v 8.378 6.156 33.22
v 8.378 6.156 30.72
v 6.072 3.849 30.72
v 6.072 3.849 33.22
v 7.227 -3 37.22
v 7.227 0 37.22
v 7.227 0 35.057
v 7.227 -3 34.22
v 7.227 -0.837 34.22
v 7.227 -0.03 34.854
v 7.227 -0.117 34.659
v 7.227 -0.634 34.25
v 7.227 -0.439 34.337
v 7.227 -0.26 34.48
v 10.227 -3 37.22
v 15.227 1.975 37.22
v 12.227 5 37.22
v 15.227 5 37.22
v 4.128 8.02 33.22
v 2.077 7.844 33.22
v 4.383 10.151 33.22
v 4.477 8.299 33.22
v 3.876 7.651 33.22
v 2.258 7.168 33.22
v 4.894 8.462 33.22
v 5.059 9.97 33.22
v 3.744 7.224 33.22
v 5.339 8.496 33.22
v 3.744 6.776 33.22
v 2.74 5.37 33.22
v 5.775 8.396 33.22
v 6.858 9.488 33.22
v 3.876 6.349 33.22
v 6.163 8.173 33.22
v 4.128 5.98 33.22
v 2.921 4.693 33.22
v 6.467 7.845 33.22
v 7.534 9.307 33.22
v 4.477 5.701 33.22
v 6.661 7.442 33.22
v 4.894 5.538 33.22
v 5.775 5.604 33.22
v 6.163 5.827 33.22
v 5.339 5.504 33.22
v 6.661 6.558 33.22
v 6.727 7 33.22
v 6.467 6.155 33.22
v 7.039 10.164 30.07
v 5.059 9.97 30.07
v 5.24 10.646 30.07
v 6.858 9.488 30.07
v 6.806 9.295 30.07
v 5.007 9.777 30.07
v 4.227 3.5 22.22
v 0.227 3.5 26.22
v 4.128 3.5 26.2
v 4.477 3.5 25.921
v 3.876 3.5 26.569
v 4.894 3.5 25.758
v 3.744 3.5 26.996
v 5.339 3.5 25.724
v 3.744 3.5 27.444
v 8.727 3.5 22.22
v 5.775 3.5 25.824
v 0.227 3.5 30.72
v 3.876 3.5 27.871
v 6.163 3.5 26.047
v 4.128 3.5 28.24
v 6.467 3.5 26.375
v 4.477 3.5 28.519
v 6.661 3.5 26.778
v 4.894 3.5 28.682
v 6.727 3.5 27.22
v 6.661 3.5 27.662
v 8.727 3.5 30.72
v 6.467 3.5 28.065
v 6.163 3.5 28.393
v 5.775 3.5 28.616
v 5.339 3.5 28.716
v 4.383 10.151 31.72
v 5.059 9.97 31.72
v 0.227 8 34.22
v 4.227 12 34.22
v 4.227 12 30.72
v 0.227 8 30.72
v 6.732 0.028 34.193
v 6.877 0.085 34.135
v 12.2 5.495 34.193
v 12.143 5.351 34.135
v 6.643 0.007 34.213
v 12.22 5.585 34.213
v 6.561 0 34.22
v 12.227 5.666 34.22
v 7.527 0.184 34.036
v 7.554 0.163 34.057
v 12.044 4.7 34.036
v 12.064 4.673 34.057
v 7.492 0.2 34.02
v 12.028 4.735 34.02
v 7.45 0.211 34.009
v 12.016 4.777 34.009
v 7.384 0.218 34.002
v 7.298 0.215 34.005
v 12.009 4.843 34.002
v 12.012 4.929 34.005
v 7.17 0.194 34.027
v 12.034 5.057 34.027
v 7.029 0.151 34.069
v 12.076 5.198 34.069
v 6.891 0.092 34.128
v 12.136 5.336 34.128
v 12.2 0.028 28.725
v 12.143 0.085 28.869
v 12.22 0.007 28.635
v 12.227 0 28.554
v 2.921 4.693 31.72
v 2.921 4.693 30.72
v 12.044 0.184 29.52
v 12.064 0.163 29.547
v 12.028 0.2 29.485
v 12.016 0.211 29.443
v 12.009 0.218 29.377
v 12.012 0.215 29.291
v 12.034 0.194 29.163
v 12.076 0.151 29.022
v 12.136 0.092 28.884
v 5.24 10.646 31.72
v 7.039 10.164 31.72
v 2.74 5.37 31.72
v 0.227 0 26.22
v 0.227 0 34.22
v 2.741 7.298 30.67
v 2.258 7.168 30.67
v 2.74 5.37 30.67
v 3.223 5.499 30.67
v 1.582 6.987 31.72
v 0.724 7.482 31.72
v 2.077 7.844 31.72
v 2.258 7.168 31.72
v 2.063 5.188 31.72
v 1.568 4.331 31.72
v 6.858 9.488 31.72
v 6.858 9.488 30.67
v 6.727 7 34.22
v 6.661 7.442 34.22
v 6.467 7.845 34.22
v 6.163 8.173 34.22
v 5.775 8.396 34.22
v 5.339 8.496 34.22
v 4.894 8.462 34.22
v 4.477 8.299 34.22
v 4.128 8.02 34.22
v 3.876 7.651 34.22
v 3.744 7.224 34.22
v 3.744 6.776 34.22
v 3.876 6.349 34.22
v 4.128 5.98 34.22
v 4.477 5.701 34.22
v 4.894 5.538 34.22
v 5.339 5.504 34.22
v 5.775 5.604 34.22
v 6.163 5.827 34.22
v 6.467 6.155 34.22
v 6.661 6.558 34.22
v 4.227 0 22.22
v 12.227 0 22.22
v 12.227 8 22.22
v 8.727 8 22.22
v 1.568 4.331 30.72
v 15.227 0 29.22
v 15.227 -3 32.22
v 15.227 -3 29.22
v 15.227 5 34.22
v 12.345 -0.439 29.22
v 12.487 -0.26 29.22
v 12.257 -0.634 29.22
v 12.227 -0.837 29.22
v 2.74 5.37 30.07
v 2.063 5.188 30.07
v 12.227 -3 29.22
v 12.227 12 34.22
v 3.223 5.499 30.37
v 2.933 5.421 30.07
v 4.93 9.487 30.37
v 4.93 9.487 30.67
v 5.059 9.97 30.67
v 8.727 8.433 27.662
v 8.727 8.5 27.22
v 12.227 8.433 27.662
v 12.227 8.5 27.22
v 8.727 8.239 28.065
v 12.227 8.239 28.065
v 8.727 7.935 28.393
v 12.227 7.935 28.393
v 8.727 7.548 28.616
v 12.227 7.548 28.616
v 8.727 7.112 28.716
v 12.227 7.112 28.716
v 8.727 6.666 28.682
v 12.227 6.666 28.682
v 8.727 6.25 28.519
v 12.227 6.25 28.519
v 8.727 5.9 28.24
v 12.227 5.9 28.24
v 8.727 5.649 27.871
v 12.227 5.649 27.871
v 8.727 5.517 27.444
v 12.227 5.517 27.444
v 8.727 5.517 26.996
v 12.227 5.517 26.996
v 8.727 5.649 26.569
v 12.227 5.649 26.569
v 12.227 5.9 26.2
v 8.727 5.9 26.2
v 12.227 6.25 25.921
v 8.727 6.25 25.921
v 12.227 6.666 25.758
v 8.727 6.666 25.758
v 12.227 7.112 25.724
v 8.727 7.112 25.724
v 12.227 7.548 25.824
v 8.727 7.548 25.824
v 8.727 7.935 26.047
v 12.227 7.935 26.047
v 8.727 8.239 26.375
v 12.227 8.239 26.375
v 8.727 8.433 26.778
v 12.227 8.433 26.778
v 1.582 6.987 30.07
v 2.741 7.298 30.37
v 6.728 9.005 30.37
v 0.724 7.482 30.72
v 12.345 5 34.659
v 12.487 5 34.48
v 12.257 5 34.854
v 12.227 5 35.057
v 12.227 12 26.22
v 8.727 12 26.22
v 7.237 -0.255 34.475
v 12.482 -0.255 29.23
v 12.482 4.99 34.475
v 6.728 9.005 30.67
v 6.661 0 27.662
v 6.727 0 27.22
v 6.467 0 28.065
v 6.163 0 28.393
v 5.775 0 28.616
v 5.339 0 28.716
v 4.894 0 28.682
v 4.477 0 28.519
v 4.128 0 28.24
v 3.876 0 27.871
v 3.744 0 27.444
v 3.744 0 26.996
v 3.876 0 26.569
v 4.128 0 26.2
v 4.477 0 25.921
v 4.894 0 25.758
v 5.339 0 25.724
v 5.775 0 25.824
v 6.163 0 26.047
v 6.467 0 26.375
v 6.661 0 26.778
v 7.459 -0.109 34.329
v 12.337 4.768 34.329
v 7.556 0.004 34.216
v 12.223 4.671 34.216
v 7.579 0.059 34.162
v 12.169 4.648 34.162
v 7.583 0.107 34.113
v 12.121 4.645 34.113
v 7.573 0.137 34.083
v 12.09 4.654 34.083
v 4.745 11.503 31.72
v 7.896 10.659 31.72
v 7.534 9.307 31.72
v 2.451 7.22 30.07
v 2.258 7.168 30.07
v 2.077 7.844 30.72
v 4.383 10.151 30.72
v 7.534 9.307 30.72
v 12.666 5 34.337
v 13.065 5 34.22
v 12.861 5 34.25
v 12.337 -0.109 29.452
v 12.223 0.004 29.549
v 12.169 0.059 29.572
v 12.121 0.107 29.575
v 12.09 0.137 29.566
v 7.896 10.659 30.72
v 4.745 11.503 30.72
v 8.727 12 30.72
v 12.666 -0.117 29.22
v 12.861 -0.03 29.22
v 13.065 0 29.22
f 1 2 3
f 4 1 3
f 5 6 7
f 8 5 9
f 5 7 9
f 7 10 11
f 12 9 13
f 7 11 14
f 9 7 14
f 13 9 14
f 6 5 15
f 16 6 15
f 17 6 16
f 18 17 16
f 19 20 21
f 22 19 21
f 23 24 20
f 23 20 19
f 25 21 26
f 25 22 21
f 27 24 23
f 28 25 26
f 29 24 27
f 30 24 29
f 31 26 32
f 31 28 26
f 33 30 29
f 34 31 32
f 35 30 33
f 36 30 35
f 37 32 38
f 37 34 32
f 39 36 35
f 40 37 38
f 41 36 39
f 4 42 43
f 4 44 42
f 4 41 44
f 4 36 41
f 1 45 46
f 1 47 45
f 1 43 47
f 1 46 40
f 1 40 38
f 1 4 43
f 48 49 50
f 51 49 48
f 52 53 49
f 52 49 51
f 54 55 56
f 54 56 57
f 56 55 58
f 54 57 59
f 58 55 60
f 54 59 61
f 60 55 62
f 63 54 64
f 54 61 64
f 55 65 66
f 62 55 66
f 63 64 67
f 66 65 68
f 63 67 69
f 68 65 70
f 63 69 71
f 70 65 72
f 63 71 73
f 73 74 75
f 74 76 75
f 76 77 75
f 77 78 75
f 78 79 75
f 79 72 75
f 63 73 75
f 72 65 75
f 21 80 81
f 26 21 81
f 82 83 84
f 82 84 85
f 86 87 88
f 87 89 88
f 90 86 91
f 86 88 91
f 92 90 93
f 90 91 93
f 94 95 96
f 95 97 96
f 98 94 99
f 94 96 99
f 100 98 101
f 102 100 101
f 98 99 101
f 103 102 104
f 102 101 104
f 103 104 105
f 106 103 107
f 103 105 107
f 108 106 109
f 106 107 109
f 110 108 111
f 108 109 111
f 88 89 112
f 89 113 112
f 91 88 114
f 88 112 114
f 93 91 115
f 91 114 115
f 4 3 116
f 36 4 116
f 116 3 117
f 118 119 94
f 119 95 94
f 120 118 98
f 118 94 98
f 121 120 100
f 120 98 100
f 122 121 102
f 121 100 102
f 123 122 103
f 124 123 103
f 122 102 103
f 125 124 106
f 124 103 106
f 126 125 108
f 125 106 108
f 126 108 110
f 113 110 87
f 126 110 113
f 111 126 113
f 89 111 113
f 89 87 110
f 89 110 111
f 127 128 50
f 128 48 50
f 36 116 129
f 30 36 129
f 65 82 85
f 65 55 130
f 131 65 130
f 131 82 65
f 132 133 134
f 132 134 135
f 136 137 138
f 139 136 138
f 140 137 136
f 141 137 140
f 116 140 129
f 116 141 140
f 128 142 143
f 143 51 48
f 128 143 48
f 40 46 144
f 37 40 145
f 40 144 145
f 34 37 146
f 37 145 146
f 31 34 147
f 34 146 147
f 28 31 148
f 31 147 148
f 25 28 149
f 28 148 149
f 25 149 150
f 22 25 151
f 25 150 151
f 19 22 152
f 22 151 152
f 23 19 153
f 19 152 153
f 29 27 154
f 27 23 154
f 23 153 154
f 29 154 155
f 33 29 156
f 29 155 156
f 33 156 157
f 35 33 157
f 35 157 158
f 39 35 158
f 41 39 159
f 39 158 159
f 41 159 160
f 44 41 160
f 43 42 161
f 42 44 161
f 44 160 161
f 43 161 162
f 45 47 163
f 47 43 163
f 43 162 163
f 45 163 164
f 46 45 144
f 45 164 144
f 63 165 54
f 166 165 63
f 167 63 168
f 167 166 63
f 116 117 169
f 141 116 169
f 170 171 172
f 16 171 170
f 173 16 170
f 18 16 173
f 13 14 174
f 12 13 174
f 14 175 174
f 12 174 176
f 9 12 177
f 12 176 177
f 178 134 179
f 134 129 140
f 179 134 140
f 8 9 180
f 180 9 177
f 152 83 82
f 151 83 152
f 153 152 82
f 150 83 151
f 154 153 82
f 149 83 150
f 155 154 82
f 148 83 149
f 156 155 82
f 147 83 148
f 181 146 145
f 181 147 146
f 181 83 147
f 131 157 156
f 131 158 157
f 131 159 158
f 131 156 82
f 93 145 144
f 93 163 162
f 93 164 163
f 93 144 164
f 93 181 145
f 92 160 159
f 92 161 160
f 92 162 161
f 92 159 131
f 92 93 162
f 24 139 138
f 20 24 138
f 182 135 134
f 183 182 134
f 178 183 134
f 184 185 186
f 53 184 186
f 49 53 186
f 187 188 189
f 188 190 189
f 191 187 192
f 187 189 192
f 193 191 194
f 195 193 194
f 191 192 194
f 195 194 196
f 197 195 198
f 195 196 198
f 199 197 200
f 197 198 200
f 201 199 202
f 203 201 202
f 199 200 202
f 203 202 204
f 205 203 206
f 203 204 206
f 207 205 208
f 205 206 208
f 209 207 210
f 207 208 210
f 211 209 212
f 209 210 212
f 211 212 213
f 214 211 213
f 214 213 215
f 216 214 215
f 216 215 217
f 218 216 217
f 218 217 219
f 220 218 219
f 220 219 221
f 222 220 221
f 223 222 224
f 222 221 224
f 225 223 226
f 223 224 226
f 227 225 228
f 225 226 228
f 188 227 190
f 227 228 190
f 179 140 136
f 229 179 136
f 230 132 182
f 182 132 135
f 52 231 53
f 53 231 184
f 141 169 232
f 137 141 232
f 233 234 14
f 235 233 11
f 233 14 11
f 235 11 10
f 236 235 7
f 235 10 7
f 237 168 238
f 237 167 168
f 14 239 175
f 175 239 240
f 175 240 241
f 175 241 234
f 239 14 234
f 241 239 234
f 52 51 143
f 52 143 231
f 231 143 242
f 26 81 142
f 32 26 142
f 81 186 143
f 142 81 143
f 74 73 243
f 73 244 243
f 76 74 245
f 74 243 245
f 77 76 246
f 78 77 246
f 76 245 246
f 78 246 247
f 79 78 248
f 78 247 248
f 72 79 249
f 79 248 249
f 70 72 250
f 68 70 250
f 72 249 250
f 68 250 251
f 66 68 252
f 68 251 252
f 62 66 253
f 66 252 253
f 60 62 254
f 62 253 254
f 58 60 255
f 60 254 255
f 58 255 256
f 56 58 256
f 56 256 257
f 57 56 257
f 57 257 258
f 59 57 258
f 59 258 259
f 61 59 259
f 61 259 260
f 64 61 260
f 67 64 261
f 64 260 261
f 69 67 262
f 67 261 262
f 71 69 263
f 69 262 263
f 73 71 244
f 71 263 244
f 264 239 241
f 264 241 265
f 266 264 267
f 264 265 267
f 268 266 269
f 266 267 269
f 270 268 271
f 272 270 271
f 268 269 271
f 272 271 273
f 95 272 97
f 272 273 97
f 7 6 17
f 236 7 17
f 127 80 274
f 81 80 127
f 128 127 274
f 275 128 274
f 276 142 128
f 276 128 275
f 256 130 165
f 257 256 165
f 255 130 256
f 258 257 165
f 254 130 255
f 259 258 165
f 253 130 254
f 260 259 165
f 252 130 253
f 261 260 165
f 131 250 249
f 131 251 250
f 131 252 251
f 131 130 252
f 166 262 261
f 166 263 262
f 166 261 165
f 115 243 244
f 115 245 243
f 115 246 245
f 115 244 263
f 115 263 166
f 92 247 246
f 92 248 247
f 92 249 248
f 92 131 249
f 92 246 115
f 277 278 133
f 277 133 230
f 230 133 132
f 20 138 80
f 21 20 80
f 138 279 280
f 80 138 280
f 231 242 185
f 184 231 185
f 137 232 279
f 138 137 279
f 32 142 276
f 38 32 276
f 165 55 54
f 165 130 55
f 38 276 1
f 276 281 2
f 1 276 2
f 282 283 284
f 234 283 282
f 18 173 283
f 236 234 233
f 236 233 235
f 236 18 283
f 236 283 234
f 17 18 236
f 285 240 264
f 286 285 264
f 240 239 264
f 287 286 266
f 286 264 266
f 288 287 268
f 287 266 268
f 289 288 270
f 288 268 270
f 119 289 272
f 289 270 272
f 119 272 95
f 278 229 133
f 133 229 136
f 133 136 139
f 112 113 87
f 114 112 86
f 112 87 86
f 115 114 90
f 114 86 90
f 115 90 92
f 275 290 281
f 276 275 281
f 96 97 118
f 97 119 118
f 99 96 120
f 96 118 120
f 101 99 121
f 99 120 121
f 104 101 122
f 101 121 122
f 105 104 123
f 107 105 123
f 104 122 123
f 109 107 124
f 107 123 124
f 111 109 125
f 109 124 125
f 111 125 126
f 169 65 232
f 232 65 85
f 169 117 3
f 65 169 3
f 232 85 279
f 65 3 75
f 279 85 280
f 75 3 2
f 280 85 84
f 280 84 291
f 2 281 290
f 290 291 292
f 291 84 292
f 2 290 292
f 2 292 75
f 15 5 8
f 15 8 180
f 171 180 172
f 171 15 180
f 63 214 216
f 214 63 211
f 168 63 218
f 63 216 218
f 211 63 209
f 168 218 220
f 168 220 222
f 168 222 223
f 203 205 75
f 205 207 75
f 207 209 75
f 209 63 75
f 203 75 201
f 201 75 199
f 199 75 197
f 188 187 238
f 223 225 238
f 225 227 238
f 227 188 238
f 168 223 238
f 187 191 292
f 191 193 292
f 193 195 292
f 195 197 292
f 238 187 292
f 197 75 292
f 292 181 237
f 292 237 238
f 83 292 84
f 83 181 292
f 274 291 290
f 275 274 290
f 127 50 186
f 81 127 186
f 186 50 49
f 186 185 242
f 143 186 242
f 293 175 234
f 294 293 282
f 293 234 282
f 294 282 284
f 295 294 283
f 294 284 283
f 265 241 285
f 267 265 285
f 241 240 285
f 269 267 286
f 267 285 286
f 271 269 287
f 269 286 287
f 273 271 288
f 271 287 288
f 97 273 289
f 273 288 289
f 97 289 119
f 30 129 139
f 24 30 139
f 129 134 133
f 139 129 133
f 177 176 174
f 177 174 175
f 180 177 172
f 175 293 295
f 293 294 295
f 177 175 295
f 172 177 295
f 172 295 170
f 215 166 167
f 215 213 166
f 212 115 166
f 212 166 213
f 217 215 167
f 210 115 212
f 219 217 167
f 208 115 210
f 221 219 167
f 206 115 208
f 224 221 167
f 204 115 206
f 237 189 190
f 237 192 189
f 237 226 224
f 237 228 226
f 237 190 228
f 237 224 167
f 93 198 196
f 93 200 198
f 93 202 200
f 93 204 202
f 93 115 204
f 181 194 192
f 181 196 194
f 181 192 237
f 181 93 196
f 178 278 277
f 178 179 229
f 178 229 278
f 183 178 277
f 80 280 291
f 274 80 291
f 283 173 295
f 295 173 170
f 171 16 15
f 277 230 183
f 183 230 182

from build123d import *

# Parameters (mm, degrees)
F1_DEPTH     = 3
F0_R         = 1.5
F2_DEPTH     = 2.5
F3_R         = 1.5
F4_DEPTH     = 5.5
F5_DEPTH     = 3
F6_R         = 1.5
F7_DEPTH     = 5.5
F8_DEPTH     = 3
F10_DEPTH    = 5
F11_T4_DEPTH = 32.8926942089
F14_DEPTH    = 0.3
F15_R        = 0.29999
F16_R        = 1
F17_R        = 0.2
F18_DEPTH    = 1
F19_DEPTH    = 1
F20_DEPTH    = 1
F21_R        = 1.5
F22_DEPTH    = 2.5
F23_DEPTH    = 1
F24_DEPTH    = 0.05
F26_DEPTH    = 0.6
F27_SIZE     = 0.3


# Not quite as in the source:
# - a fillet or chamfer that OpenCascade refuses, or shapes differently, is made with other operations: its cross-section is extruded or revolved along the edge and cut away or added
# - a fillet or chamfer is up to 0.001 mm smaller than in the source, because OpenCascade refuses the exact size


with BuildPart() as f1:
    # F0 (on Front) → F1 (new body)
    with BuildSketch(Plane.XZ):
        Polygon((15.2273818341, 37.2200216049), (7.2273818341, 37.2200216049), (7.2273818341, 34.2200216049), (12.2273818341, 29.2200216049), (15.2273818341, 29.2200216049), align=None)
    extrude(amount=F1_DEPTH)

    # F0 (on Front) → F2 (join)
    with BuildSketch(Plane.XZ):
        Polygon((7.2273818341, 34.2200216049), (7.2273818341, 37.2200216049), (0.2273818341, 37.2200216049), (0.2273818341, 26.2200216049), (4.2273818341, 22.2200216049), (15.2273818341, 22.2200216049), (15.2273818341, 29.2200216049), (12.2273818341, 29.2200216049), align=None)
        with Locations((5.2273818341, 27.2200216049)):
            Circle(F0_R, mode=Mode.SUBTRACT)
        Polygon((15.2273818341, 37.2200216049), (7.2273818341, 37.2200216049), (7.2273818341, 34.2200216049), (12.2273818341, 29.2200216049), (15.2273818341, 29.2200216049), align=None)
    extrude(amount=-F2_DEPTH)

    # F3 (on face) → F4 (join)
    with BuildSketch(Plane.XY.offset(37.2200216049)):
        Polygon((0.2273818341, 2.5), (9.7273818341, 2.5), (12.2273818341, 5), (12.2273818341, 12), (4.2273818341, 12), (0.2273818341, 8), align=None)
        with Locations((5.2273818341, 7)):
            Circle(F3_R, mode=Mode.SUBTRACT)
        Polygon((9.7273818341, 2.5), (15.2273818341, 2.5), (15.2273818341, 5), (12.2273818341, 5), align=None)
    extrude(amount=-F4_DEPTH)

    # F3 (on face) → F5 (cut)
    with BuildSketch(Plane.XY.offset(37.2200216049)):
        Polygon((0.2273818341, 2.5), (9.7273818341, 2.5), (12.2273818341, 5), (12.2273818341, 12), (4.2273818341, 12), (0.2273818341, 8), align=None)
        with Locations((5.2273818341, 7)):
            Circle(F3_R, mode=Mode.SUBTRACT)
        Polygon((0.2273818341, 0), (7.2273818341, 0), (9.7273818341, 2.5), (0.2273818341, 2.5), align=None)
    extrude(amount=-F5_DEPTH, mode=Mode.SUBTRACT)

    # F6 (on face) → F7 (join)
    with BuildSketch(Plane.YZ.offset(15.2273818341)):
        Polygon((5, 34.2200216049), (0, 29.2200216049), (0, 22.2200216049), (8, 22.2200216049), (12, 26.2200216049), (12, 34.2200216049), align=None)
        with Locations((7, 27.2200216049)):
            Circle(F6_R, mode=Mode.SUBTRACT)
    extrude(amount=-F7_DEPTH)

    # F6 (on face) → F8 (cut)
    with BuildSketch(Plane.YZ.offset(15.2273818341)):
        Polygon((2.5, 31.7200216049), (0, 29.2200216049), (0, 22.2200216049), (2.5, 22.2200216049), align=None)
        Polygon((5, 31.7200216049), (2.5, 31.7200216049), (2.5, 22.2200216049), (8, 22.2200216049), (12, 26.2200216049), (12, 34.2200216049), (5, 34.2200216049), align=None)
        with Locations((7, 27.2200216049)):
            Circle(F6_R, mode=Mode.SUBTRACT)
        Polygon((5, 34.2200216049), (2.5, 31.7200216049), (5, 31.7200216049), align=None)
    extrude(amount=-F8_DEPTH, mode=Mode.SUBTRACT)

    # F9 (on face) → F10 (cut)
    with BuildSketch(Plane.XZ.offset(3)):
        Polygon((15.2273818341, 32.2200216049), (15.2273818341, 37.2200216049), (10.2273818341, 37.2200216049), align=None)
    extrude(amount=-F10_DEPTH, mode=Mode.SUBTRACT)

    # F11: chamfer of 5 x 3.5533150469 on 1 edges, made by hand


with BuildPart() as f11_tool2:
    # F11_s3 → F11_t4 (new body)
    with BuildSketch(Plane(origin=(-22.6256434487, 0, 22.6256434487), x_dir=(0, 1, 0), z_dir=(0.7071067812, 0, -0.7071067812))):
        Polygon((2, 37.1036957683), (-3, 33.5503807214), (2, 33.5503807214), align=None)
    extrude(amount=F11_T4_DEPTH)

    split(bisect_by=Plane.YZ.offset(15.2273818341), keep=Keep.BOTTOM)

    split(bisect_by=Plane.XZ.offset(3), keep=Keep.BOTTOM)

    split(bisect_by=Plane.XY.offset(37.2200216049), keep=Keep.BOTTOM)


with BuildPart() as f1_1:
    add(f1.part)

    # F11_t1: union F11_tool2
    add(f11_tool2.part)

    # F13 (on 3pt) → F14 (cut, symmetric)
    with BuildSketch(Plane(origin=(13.8158011463, -13.8158011463, 13.8158011463), x_dir=(0.8164965809, 0.4082482905, -0.4082482905), z_dir=(0.5773502692, -0.5773502692, 0.5773502692))):
        Polygon((-1.0654091424, 19.1374719877), (-1.0654091424, 29.2569466706), (-9.8291312908, 24.1972093292), align=None)
        Polygon((-1.9454084062, 20.6616754232), (-8.0691327632, 24.1972093292), (-1.9454084062, 27.7327432351), align=None, mode=Mode.SUBTRACT)
        Polygon((-1.9454084062, 27.7327432351), (-8.0691327632, 24.1972093292), (-1.9454084062, 20.6616754232), align=None)
        Polygon((-7.6691327632, 24.1972093292), (-2.1454084062, 27.3863330736), (-2.1454084062, 21.0080855847), align=None, mode=Mode.SUBTRACT)
    extrude(amount=F14_DEPTH, both=True, mode=Mode.SUBTRACT)

    # F15 (radius 0.3 in the source; OpenCascade refuses exactly that, so slightly less here)
    f15_edges = [f1_1.edges().sort_by_distance(p)[0] for p in [
        (9.635826, 2.591555, 33.883517),
        (11.890877, 2.591555, 31.628466),
        (9.982237, 2.245145, 34.229927),
        (12.237288, 2.245145, 31.974876),
        (9.635826, 0.336504, 31.628466),
        (9.982237, -0.009906, 31.974876),
    ]]
    fillet(f15_edges, radius=F15_R)

    # F16
    f16_edges = [f1_1.edges().sort_by_distance(p)[0] for p in [
        (12.746997, 2.5, 31.720022),
        (9.727382, -0.519615, 31.720022),
        (9.727382, 2.5, 34.739637),
    ]]
    fillet(f16_edges, radius=F16_R)

    # F17
    f17_edges = [f1_1.edges().sort_by_distance(p)[0] for p in [
        (9.467574, 0, 31.460214),
        (12.227382, 2.759808, 31.460214),
        (9.467574, 2.759808, 34.220022),
    ]]
    fillet(f17_edges, radius=F17_R)

    # F18 (add): a face of the model
    f18_faces = [f1_1.faces().sort_by_distance(p)[0] for p in [
        (4.9773818341, 2.5, 31.5856713165),
    ]]
    extrude(f18_faces, amount=F18_DEPTH)

    # F19 (add): a face of the model
    f19_faces = [f1_1.faces().sort_by_distance(p)[0] for p in [
        (9.7273818341, 7.75, 31.592546117),
    ]]
    extrude(f19_faces, amount=F19_DEPTH)

    # F20 (add): a face of the model
    f20_faces = [f1_1.faces().sort_by_distance(p)[0] for p in [
        (4.4773818341, 3.6202081528, 31.7200216049),
    ]]
    extrude(f20_faces, amount=F20_DEPTH)

    # F21 (on face) → F22 (cut)
    with BuildSketch(Plane(origin=(0, 0, 30.7200216049), x_dir=(1, 0, 0), z_dir=(0, 0, -1))):
        Polygon((2.0765037567, -7.8442752363), (4.3831065978, -10.1508780774), (5.0592546763, -9.9697047458), (4.9816089627, -9.679926998), (6.7801908833, -9.1979984248), (6.8578365969, -9.4877761727), (7.5339846753, -9.3066028411), (8.3782599116, -6.1557247637), (6.0716570704, -3.8491219226), (2.920778993, -4.6933971589), (2.7396056614, -5.3695452373), (3.0293834093, -5.4471909508), (2.5474548362, -7.2457728714), (2.2576770883, -7.1681271579), align=None)
        with Locations((5.2273818341, -7)):
            Circle(F21_R, mode=Mode.SUBTRACT)
        Polygon((2.7396056614, -5.3695452373), (2.2576770883, -7.1681271579), (2.5474548362, -7.2457728714), (3.0293834093, -5.4471909508), align=None)
        Polygon((4.9816089627, -9.679926998), (5.0592546763, -9.9697047458), (6.8578365969, -9.4877761727), (6.7801908833, -9.1979984248), align=None)
    extrude(amount=-F22_DEPTH, mode=Mode.SUBTRACT)

    # F21 (on face) → F23 (cut)
    with BuildSketch(Plane(origin=(0, 0, 30.7200216049), x_dir=(1, 0, 0), z_dir=(0, 0, -1))):
        Polygon((0.7242075999, -7.4819285731), (2.0765037567, -7.8442752363), (2.2576770883, -7.1681271579), (1.5815290099, -6.9869538263), (2.063457583, -5.1883719057), (2.7396056614, -5.3695452373), (2.920778993, -4.6933971589), (1.5684828362, -4.3310504957), align=None)
        Polygon((5.0592546763, -9.9697047458), (4.3831065978, -10.1508780774), (4.745453261, -11.5031742342), (7.8963313384, -10.6588989979), (7.5339846753, -9.3066028411), (6.8578365969, -9.4877761727), (7.0390099284, -10.1639242511), (5.2404280078, -10.6458528242), align=None)
    extrude(amount=-F23_DEPTH, mode=Mode.SUBTRACT)

    # F21 (on face) → F24 (join, symmetric)
    with BuildSketch(Plane(origin=(0, 0, 30.7200216049), x_dir=(1, 0, 0), z_dir=(0, 0, -1))):
        Polygon((1.5815290099, -6.9869538263), (2.2576770883, -7.1681271579), (2.7396056614, -5.3695452373), (2.063457583, -5.1883719057), align=None)
        Polygon((6.8578365969, -9.4877761727), (5.0592546763, -9.9697047458), (5.2404280078, -10.6458528242), (7.0390099284, -10.1639242511), align=None)
    extrude(amount=F24_DEPTH, both=True)

    # F25 (on face) → F26 (join)
    with BuildSketch(Plane(origin=(0, 0, 30.6700216049), x_dir=(1, 0, 0), z_dir=(0, 0, -1))):
        Polygon((2.7396056614, -5.3695452373), (2.2576770883, -7.1681271579), (2.7406400014, -7.2975366804), (3.2225685746, -5.4989547598), align=None)
        Polygon((1.5815290099, -6.9869538263), (2.2576770883, -7.1681271579), (2.7396056614, -5.3695452373), (2.063457583, -5.1883719057), align=None)
        Polygon((4.9298451537, -9.4867418327), (5.0592546763, -9.9697047458), (6.8578365969, -9.4877761727), (6.7284270743, -9.0048132595), align=None)
        Polygon((5.0592546763, -9.9697047458), (5.2404280078, -10.6458528242), (7.0390099284, -10.1639242511), (6.8578365969, -9.4877761727), align=None)
    extrude(amount=F26_DEPTH)

    # F27
    f27_edges = [f1_1.edges().sort_by_distance(p)[0] for p in [
        (2.981604, 6.398246, 30.070022),
        (5.829136, 9.245778, 30.070022),
    ]]
    chamfer(f27_edges, length=F27_SIZE)


solid = f1_1.part
